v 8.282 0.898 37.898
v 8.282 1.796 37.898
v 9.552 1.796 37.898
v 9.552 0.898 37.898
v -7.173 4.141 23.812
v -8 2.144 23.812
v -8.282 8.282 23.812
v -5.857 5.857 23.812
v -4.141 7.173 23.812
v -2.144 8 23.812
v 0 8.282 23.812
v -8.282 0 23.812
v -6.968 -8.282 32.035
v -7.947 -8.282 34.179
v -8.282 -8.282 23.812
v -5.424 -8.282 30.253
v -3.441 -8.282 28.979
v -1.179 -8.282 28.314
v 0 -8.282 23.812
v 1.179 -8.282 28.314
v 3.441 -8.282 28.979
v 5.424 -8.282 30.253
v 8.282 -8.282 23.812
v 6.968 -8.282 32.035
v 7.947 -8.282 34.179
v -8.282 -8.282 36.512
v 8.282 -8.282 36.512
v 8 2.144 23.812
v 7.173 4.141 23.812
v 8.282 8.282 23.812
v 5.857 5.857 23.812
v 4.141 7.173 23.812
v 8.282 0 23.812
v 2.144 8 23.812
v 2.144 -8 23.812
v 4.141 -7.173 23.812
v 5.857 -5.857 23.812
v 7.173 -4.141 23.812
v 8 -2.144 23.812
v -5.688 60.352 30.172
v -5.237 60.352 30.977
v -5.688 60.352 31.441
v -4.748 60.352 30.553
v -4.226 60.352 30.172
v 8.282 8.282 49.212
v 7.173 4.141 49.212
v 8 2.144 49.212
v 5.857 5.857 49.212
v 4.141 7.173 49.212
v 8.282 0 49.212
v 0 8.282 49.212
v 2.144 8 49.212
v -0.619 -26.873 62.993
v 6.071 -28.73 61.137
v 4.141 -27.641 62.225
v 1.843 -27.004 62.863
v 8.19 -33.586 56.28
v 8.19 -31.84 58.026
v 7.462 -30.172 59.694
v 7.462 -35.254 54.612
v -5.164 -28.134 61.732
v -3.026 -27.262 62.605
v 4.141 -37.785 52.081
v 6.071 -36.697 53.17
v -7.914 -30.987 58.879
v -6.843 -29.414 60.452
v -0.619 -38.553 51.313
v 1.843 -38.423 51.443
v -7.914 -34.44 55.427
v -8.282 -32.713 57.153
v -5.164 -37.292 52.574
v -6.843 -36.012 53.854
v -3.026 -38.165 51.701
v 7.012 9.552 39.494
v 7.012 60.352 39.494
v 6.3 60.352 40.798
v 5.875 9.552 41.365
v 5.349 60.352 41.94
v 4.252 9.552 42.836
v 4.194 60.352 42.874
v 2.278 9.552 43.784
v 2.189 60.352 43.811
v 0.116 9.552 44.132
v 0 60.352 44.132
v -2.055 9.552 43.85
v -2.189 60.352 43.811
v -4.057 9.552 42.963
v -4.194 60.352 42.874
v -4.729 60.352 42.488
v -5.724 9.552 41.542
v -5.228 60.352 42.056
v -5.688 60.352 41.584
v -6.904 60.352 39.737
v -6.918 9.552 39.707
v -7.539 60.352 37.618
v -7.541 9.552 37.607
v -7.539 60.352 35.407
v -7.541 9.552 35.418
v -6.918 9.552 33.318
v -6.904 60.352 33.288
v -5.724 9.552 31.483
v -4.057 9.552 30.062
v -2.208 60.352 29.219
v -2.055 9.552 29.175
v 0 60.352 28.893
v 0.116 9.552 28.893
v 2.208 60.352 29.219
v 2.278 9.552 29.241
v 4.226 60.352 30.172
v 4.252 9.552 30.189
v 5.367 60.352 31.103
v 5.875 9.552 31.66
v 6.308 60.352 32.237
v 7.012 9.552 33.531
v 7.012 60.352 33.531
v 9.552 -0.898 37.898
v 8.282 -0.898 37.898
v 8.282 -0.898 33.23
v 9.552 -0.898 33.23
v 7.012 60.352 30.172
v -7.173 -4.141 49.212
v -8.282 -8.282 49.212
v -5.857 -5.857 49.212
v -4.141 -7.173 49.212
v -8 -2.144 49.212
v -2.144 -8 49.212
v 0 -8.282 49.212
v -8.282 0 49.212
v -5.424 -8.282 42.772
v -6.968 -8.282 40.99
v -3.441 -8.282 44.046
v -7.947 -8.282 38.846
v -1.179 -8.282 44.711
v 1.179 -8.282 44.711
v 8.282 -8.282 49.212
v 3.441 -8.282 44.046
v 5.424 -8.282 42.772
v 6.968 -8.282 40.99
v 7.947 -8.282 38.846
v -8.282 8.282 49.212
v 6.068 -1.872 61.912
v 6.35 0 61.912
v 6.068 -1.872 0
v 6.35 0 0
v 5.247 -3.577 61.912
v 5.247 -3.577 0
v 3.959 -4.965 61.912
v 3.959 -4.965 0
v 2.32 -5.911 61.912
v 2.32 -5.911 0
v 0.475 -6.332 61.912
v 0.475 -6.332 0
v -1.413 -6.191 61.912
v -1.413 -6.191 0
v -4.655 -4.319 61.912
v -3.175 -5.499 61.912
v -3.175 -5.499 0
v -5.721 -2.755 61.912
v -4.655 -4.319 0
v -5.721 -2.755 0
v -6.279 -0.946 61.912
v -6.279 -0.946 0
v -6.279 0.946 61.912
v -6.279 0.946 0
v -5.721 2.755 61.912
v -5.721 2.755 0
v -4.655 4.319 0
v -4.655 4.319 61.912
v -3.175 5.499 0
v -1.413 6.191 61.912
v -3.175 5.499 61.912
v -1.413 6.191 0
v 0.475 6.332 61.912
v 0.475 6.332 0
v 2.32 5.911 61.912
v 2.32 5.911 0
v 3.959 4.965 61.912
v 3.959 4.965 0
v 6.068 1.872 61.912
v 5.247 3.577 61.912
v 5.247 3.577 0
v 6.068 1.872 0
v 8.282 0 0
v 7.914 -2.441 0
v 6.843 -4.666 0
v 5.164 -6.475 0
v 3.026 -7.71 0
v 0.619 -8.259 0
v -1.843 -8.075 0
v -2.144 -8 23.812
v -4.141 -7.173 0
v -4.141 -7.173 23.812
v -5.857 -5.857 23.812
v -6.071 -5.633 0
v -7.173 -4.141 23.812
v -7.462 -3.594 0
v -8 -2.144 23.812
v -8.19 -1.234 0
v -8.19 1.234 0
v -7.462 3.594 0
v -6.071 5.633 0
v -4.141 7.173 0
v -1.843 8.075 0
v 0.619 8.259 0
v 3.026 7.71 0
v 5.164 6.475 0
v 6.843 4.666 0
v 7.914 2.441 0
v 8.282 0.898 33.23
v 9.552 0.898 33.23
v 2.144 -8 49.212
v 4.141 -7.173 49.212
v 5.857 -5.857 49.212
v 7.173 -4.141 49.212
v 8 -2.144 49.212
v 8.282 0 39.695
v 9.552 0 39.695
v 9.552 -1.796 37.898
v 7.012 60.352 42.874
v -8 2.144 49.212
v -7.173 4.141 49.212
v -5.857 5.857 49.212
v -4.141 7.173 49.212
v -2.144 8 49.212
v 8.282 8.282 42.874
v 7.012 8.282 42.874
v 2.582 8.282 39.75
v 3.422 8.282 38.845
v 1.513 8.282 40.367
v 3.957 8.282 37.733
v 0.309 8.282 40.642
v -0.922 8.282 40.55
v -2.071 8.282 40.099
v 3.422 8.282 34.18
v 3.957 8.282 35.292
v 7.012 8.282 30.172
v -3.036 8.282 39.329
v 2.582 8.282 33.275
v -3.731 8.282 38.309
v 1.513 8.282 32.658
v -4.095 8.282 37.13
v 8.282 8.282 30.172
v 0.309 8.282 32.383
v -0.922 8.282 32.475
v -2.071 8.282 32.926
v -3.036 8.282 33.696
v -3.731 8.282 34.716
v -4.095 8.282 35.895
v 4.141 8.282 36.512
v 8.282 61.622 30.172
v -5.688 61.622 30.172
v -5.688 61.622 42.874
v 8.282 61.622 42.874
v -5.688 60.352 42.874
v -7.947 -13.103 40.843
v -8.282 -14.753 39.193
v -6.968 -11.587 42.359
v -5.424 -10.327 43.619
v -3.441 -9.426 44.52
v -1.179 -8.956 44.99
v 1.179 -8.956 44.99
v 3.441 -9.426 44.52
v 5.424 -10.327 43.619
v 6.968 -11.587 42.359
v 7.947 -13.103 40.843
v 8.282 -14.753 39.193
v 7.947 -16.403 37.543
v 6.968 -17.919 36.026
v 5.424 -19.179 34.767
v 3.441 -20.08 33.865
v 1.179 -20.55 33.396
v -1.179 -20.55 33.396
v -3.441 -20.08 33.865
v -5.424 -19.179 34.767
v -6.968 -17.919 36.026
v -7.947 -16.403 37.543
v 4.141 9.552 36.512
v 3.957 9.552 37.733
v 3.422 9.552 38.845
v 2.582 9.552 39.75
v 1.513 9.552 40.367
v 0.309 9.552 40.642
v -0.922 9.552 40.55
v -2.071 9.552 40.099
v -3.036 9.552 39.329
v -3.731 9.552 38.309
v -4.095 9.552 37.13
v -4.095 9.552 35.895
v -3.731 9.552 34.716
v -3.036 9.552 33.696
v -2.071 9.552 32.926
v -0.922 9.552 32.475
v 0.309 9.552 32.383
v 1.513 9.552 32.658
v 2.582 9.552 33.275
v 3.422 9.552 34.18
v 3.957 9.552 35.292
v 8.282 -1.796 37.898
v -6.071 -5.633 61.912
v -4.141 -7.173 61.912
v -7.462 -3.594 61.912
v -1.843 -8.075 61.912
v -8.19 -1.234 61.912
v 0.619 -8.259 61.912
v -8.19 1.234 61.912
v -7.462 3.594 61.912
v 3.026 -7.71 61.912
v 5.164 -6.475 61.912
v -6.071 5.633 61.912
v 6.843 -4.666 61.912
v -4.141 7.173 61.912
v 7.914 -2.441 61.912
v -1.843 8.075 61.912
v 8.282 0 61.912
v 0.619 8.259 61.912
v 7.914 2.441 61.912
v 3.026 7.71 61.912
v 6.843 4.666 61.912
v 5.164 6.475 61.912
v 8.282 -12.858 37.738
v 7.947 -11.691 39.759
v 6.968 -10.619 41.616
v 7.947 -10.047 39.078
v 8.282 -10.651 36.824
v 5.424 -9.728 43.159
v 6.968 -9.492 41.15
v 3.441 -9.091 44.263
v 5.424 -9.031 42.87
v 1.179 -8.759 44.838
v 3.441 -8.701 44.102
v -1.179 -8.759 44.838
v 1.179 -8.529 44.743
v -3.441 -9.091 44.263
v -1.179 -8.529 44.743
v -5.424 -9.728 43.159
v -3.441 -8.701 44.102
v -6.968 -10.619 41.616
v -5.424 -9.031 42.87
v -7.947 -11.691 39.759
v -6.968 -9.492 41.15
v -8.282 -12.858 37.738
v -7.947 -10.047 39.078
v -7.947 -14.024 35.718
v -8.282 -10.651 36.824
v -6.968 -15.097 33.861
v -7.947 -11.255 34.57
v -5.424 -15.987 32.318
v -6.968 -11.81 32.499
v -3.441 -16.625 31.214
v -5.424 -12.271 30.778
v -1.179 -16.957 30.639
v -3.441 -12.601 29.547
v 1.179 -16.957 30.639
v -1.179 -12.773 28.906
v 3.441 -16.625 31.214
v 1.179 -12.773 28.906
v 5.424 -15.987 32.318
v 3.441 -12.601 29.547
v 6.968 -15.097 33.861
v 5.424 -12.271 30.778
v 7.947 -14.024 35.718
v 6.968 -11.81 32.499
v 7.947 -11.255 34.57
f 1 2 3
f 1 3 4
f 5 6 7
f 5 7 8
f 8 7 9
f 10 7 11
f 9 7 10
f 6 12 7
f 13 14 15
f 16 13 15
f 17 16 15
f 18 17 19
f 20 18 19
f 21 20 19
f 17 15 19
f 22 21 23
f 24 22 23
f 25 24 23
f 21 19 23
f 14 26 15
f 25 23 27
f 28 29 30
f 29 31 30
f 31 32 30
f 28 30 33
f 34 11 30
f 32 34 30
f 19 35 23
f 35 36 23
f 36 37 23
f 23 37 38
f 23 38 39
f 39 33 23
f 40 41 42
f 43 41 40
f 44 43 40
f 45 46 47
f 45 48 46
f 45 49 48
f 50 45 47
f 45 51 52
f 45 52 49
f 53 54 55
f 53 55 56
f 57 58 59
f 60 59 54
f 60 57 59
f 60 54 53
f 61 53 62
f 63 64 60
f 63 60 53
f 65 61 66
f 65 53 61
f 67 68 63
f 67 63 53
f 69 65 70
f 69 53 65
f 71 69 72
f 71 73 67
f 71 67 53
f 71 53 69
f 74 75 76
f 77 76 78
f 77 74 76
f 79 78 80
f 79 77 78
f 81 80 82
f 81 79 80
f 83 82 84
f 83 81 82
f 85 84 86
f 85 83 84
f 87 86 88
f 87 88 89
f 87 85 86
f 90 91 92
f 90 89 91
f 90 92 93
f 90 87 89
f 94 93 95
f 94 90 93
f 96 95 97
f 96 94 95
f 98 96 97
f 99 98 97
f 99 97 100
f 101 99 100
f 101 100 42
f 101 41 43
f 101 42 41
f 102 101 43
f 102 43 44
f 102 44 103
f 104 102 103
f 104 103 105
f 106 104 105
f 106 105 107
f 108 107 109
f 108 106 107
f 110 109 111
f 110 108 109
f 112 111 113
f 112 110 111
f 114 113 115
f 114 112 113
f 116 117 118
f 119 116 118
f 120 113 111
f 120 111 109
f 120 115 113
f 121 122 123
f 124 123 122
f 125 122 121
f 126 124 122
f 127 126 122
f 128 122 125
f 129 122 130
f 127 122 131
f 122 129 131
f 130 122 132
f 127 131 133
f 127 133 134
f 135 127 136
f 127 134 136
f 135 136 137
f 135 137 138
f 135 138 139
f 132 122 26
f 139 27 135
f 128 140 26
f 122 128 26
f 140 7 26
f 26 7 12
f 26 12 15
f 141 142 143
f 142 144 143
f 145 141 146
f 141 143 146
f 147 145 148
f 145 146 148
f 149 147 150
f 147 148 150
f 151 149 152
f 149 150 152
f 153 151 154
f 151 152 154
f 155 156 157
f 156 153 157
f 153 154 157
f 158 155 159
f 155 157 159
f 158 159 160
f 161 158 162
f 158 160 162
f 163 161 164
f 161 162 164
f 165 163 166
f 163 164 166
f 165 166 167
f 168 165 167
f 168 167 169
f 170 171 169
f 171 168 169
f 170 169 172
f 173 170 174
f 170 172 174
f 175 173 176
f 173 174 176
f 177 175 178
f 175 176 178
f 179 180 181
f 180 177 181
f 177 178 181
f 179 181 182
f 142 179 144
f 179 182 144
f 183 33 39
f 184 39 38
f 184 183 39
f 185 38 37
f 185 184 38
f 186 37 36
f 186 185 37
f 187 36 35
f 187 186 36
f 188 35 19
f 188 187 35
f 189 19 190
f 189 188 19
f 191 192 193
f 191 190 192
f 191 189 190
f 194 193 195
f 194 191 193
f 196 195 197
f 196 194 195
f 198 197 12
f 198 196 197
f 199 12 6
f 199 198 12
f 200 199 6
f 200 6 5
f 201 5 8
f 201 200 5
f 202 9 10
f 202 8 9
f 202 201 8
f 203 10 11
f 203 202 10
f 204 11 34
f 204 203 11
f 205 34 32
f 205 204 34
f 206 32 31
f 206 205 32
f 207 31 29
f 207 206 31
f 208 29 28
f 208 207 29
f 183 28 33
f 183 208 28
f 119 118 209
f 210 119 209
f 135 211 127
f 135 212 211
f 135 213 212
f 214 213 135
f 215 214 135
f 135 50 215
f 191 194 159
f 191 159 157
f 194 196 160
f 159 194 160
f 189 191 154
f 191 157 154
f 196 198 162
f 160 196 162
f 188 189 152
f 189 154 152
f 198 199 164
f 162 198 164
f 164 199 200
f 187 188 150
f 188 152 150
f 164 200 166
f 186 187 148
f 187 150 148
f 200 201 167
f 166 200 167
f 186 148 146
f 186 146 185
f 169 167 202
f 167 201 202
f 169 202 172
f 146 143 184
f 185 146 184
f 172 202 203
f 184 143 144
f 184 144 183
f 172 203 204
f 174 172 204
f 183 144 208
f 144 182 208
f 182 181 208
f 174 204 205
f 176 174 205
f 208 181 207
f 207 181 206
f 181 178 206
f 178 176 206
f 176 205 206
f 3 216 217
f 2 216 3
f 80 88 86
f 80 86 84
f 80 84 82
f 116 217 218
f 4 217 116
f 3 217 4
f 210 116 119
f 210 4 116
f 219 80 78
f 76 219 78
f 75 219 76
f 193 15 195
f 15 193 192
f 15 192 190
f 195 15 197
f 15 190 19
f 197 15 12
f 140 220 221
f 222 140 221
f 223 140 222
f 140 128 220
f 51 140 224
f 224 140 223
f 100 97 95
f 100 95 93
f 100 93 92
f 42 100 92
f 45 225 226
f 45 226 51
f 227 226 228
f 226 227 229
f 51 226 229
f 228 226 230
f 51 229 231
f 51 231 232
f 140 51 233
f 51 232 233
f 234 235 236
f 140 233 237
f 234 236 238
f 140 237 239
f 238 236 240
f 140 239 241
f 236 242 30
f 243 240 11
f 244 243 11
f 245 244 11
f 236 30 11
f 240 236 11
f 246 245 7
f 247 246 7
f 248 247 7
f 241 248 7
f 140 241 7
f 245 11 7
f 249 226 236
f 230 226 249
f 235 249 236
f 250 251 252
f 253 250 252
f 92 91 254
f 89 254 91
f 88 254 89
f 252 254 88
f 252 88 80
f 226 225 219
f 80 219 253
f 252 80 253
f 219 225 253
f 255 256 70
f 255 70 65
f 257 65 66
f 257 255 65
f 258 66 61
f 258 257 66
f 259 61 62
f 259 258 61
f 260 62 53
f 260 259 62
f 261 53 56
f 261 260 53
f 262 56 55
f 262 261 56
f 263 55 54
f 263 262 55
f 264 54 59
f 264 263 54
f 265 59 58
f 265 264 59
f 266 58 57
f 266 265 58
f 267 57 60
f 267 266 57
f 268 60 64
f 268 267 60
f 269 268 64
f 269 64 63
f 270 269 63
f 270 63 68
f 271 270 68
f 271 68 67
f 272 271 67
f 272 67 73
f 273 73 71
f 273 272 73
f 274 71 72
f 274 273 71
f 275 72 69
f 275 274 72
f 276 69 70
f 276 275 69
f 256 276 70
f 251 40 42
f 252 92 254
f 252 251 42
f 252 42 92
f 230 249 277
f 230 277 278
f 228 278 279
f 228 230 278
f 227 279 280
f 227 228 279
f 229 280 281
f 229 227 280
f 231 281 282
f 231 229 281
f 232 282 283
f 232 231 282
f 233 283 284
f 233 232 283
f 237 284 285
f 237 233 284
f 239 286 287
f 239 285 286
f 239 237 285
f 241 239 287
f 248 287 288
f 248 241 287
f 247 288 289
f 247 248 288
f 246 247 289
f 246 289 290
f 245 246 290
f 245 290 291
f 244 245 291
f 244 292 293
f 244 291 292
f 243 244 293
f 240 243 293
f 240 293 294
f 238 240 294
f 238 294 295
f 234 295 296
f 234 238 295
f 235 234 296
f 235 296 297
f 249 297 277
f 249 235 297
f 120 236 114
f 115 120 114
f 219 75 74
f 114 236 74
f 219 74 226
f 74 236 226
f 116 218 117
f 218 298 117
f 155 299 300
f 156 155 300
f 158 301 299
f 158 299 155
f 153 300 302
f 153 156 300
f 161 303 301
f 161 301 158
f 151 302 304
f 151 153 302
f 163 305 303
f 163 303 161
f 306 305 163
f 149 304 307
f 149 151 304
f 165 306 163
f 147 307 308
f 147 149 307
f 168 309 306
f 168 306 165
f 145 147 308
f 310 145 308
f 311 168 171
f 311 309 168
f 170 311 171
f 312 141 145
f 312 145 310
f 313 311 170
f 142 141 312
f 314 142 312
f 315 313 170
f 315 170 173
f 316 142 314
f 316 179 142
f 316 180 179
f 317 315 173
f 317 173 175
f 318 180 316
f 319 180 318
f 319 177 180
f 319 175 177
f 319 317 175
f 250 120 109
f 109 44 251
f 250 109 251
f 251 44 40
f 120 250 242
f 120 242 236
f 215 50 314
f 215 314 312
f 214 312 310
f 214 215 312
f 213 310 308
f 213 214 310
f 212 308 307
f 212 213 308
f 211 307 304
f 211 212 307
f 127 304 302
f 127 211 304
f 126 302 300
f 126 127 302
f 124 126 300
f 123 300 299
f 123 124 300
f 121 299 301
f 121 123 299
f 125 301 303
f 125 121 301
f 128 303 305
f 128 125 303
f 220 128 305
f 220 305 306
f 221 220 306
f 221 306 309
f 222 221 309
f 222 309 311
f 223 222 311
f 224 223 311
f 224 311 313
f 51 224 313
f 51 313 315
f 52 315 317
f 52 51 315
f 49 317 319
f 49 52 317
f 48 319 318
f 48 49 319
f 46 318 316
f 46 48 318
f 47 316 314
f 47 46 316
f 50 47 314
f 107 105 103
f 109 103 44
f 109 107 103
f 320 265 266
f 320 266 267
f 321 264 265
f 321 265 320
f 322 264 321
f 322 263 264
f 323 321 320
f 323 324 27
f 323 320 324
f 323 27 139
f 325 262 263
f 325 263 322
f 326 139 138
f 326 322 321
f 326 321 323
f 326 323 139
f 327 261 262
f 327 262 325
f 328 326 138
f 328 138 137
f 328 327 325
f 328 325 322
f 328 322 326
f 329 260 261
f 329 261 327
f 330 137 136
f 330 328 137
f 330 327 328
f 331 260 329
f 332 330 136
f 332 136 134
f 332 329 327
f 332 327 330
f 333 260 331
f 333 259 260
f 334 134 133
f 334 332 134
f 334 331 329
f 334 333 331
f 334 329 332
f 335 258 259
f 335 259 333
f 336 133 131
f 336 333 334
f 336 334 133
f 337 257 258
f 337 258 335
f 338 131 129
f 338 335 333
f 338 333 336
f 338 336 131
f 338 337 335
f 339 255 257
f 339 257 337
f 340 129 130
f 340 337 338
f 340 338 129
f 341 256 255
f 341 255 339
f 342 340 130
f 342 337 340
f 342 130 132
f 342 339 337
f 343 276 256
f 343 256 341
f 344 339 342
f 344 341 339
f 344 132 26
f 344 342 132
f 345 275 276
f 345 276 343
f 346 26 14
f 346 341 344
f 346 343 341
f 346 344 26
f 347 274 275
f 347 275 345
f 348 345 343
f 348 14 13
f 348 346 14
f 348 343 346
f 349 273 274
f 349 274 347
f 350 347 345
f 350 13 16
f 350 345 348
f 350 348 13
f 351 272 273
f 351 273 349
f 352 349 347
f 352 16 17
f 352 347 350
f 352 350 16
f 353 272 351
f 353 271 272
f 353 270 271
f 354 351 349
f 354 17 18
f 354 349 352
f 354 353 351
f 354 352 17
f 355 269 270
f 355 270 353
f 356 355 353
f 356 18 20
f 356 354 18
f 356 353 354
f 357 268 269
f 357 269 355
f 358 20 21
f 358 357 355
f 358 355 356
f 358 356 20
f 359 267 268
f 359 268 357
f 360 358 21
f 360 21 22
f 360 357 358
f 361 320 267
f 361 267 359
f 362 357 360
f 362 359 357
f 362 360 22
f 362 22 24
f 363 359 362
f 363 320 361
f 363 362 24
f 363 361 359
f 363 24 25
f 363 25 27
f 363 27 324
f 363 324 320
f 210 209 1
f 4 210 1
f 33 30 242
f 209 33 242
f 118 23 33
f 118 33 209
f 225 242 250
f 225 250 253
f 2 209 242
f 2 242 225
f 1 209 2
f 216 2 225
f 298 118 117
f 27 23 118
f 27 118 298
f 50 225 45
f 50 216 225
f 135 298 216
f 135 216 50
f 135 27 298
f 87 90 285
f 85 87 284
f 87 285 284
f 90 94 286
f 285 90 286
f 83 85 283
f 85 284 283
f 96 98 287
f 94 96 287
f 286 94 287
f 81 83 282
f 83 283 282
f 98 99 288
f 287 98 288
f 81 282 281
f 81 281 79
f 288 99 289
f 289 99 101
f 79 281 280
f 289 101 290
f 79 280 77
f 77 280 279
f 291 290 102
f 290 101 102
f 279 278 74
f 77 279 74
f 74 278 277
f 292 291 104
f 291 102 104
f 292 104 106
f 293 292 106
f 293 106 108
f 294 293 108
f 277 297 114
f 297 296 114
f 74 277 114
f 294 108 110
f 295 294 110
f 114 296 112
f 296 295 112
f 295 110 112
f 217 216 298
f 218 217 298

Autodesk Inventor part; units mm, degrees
ref_plane "YZ Plane" through (0, 0, 0) normal (1, 0, 0) x (0, 1, 0)
ref_plane "XZ Plane" through (0, 0, 0) normal (0, 1, 0) x (-1, 0, 0)
ref_plane "XY Plane" through (0, 0, 0) normal (0, 0, 1) x (1, 0, 0)
sketch "Sketch1" plane through (0, 0, 0) normal (0, 0, 1) x (1, 0, 0)
  circle A0 centre (0, 0) radius 6.35
  circle A1 centre (0, 0) radius 8.2824
  dimension "d0" = 12.7
extrude "Extrusion1" add sketch "Sketch1" along normal blind 23.8125
sketch "Sketch2" plane through (0, 0, 23.8125) normal (0, 0, 1) x (1, 0, 0)
  circle A0 centre (0, 0) radius 6.35 projected
  circle A1 centre (0, 0) radius 8.2824 projected
  line L0 (8.2824, 8.2824) -> (-8.2824, 8.2824)
  line L1 (-8.2824, -8.2824) -> (8.2824, -8.2824)
  line L2 (8.2824, -8.2824) -> (8.2824, 8.2824)
  line L3 (-8.2824, 8.2824) -> (-8.2824, -8.2824)
  circle A2 centre (0, 0) radius 6.35
extrude "Extrusion2" add sketch "Sketch2" along normal blind 25.4
sketch "Sketch3" plane through (0, 0, 49.2125) normal (0, 0, 1) x (1, 0, 0)
  circle A0 centre (0, 0) radius 6.35 projected
  circle A1 centre (0, 0) radius 6.35
  circle A2 centre (0, 0) radius 8.2824
extrude "Extrusion3" add sketch "Sketch3" along normal blind 12.7
sketch "Sketch4" plane through (8.2824, -8.2824, 23.8125) normal (1, 0, 0) x (0, 0, -1)
  line L0 (-15.8821, 8.2824) -> (-14.086, 10.0784)
  line L1 (-15.8821, 8.2824) -> (-13.3421, 8.2824) construction
  line L2 (-14.086, 10.0784) -> (-14.086, 9.1804)
  line L3 (-15.8821, 8.2824) -> (-14.086, 6.4863)
  line L4 (-14.086, 6.4863) -> (-14.086, 7.3843)
  line L5 (-14.086, 7.3843) -> (-9.4174, 7.3843)
  line L6 (-9.4174, 7.3843) -> (-9.4174, 9.1804)
  line L7 (-9.4174, 9.1804) -> (-14.086, 9.1804)
  point P0 (23.8125, 8.2824)
  dimension "d7" = 2.54
  dimension "d8" = 45
extrude "Extrusion4" add sketch "Sketch4" along normal blind 1.27
sketch "Sketch5" plane through (0, 8.2824, 23.8125) normal (0, 1, 0) x (1, 0, 0)
  circle A0 centre (0, -12.7) radius 4.1412
  point P0 (0, 23.8125)
extrude "Extrusion5" add sketch "Sketch5" along normal blind 1.27
sketch "Sketch6" plane through (0, 9.5524, 36.5125) normal (0, 1, 0) x (1, 0, 0)
  circle A0 centre (0, 0) radius 4.1412 projected
  circle A1 centre (0, 0) radius 7.62
  point P0 (0, 36.5125)
  dimension "d13" = 15.24
extrude "Extrusion6" add sketch "Sketch6" along normal blind 50.8 contours A0 | A1
sketch "Sketch7" plane through (0, 8.2824, 23.8125) normal (0, 1, 0) x (1, 0, 0)
  line L0 (8.2824, 0) -> (8.2824, -25.4) projected
  line L1 (8.2824, -19.0619) -> (8.2824, -6.3591)
  line L2 (8.2824, -6.3591) -> (7.0124, -6.3591)
  line L3 (7.0124, -6.3591) -> (7.0124, -19.0619)
  line L4 (7.0124, -19.0619) -> (8.2824, -19.0619)
  point P0 (0, 23.8125)
  dimension "d16" = 1.27
extrude "Extrusion7" add sketch "Sketch7" along normal blind 53.34
sketch "Sketch8" plane through (7.0124, 8.2824, 30.1716) normal (-1, 0, 0) x (0, 0, 1)
  line L0 (12.7028, 0) -> (12.7028, 53.34) projected
  line L1 (0, 53.34) -> (12.7028, 53.34)
  line L2 (12.7028, 53.34) -> (12.7028, 52.07)
  line L3 (12.7028, 52.07) -> (0, 52.07)
  line L4 (0, 52.07) -> (0, 53.34)
  point P0 (-30.1716, -8.2824)
  dimension "d19" = 1.27
extrude "Extrusion8" add sketch "Sketch8" along normal blind 12.7
sketch "Sketch9" plane through (-8.2824, -8.2824, 23.8125) normal (0, -1, 0) x (1, 0, 0)
  line L0 (0, 0) -> (0, 25.4) projected
  line L1 (16.5647, 0) -> (16.5647, 25.4) projected
  circle A0 centre (8.2824, 12.7) radius 8.2824
  line L2 (0, 21.8506) -> (16.5647, 21.8506)
  point P0 (8.2824, -23.8125)
revolve "Revolution1" add sketch "Sketch9" angle 45 about axis through (-8.2824, -8.2824, 45.6631) along (-1, 0, 0) contours A0
sketch "Sketch10" plane through (0, -14.7528, 39.1926) normal (0, -0.7071, 0.7071) x (-1, 0, 0)
  circle A0 centre (0, 0) radius 8.2824 projected
  circle A1 centre (0, 0) radius 8.2824
  point P0 (0, 17.2816)
extrude "Extrusion9" add sketch "Sketch10" along normal blind 25.4
thread "Thread1" size "1/2-13 UNC" class "2B" standard "ANSI Unified Screw Threads" full length
properties part number "solenoid valve"
